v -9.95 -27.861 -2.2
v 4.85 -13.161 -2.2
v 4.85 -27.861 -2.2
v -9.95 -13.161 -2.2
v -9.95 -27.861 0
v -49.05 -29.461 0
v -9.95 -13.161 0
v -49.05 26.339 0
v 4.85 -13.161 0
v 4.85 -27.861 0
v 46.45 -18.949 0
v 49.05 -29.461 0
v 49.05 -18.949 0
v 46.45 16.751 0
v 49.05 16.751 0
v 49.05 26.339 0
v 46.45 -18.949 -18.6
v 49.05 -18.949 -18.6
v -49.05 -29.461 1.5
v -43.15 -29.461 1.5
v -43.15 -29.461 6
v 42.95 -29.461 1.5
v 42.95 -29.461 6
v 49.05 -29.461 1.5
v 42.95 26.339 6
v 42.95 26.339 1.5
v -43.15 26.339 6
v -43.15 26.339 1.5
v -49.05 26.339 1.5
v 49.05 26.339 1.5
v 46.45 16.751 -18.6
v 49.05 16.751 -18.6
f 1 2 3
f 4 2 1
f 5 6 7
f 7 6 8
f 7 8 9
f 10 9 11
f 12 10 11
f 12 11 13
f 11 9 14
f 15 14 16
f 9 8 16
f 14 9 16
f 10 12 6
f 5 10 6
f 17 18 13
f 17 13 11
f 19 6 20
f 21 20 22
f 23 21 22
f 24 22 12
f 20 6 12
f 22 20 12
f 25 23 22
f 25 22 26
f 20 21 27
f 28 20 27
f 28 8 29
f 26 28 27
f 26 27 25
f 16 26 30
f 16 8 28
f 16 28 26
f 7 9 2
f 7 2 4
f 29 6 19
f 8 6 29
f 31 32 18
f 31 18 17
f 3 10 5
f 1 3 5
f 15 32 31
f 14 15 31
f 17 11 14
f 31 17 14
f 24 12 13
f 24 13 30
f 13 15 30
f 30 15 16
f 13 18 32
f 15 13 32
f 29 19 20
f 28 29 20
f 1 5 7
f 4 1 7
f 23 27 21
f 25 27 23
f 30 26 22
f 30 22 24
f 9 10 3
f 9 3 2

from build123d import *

# Parameters (mm, degrees)
SKETCH1_W           = 98.1
SKETCH1_H           = 55.8
BOSS_EXTRUDE1_DEPTH = 6
SKETCH2_W           = 5.9
SKETCH2_H           = 55.8
SKETCH2_W_2         = 6.1
CUT_EXTRUDE1_DEPTH  = 4.5
SKETCH3_W           = 14.8
SKETCH3_H           = 14.7
BOSS_EXTRUDE4_DEPTH = 4.1
SKETCH4_W           = 2.6
SKETCH4_H           = 35.7
BOSS_EXTRUDE5_DEPTH = 18.6
SKETCH5_W           = 14.8
SKETCH5_H           = 14.7
BOSS_EXTRUDE6_DEPTH = 2.2


with BuildPart() as part:
    # Sketch1 → Boss-Extrude1 (new body)
    with BuildSketch(Plane.XY):
        with Locations((0, -1.56102071)):
            Rectangle(SKETCH1_W, SKETCH1_H)
    extrude(amount=BOSS_EXTRUDE1_DEPTH)

    # Sketch2 → Cut-Extrude1 (cut)
    with BuildSketch(Plane.XY.offset(6)):
        with Locations((-46.1, -1.56102071)):
            Rectangle(SKETCH2_W, SKETCH2_H)
        with Locations((46, -1.56102071)):
            Rectangle(SKETCH2_W_2, SKETCH2_H)
    extrude(amount=-CUT_EXTRUDE1_DEPTH, mode=Mode.SUBTRACT)

    # Sketch3 → Boss-Extrude4 (add)
    with BuildSketch(Plane.XY.offset(6)):
        with Locations((-1.877850501, -21.022317242)):
            Rectangle(SKETCH3_W, SKETCH3_H)
    extrude(amount=-BOSS_EXTRUDE4_DEPTH)

    # Sketch4 → Boss-Extrude5 (add)
    with BuildSketch(Plane(origin=(0, 0, 0), x_dir=(-1, 0, 0), z_dir=(0, 0, -1))):
        with Locations((-47.75, -1.098812698)):
            Rectangle(SKETCH4_W, SKETCH4_H)
    extrude(amount=BOSS_EXTRUDE5_DEPTH)

    # Sketch5 → Boss-Extrude6 (add)
    with BuildSketch(Plane(origin=(0, 0, 0), x_dir=(-1, 0, 0), z_dir=(0, 0, -1))):
        with Locations((2.55, -20.51102071)):
            Rectangle(SKETCH5_W, SKETCH5_H)
    extrude(amount=BOSS_EXTRUDE6_DEPTH)


solid = part.part
